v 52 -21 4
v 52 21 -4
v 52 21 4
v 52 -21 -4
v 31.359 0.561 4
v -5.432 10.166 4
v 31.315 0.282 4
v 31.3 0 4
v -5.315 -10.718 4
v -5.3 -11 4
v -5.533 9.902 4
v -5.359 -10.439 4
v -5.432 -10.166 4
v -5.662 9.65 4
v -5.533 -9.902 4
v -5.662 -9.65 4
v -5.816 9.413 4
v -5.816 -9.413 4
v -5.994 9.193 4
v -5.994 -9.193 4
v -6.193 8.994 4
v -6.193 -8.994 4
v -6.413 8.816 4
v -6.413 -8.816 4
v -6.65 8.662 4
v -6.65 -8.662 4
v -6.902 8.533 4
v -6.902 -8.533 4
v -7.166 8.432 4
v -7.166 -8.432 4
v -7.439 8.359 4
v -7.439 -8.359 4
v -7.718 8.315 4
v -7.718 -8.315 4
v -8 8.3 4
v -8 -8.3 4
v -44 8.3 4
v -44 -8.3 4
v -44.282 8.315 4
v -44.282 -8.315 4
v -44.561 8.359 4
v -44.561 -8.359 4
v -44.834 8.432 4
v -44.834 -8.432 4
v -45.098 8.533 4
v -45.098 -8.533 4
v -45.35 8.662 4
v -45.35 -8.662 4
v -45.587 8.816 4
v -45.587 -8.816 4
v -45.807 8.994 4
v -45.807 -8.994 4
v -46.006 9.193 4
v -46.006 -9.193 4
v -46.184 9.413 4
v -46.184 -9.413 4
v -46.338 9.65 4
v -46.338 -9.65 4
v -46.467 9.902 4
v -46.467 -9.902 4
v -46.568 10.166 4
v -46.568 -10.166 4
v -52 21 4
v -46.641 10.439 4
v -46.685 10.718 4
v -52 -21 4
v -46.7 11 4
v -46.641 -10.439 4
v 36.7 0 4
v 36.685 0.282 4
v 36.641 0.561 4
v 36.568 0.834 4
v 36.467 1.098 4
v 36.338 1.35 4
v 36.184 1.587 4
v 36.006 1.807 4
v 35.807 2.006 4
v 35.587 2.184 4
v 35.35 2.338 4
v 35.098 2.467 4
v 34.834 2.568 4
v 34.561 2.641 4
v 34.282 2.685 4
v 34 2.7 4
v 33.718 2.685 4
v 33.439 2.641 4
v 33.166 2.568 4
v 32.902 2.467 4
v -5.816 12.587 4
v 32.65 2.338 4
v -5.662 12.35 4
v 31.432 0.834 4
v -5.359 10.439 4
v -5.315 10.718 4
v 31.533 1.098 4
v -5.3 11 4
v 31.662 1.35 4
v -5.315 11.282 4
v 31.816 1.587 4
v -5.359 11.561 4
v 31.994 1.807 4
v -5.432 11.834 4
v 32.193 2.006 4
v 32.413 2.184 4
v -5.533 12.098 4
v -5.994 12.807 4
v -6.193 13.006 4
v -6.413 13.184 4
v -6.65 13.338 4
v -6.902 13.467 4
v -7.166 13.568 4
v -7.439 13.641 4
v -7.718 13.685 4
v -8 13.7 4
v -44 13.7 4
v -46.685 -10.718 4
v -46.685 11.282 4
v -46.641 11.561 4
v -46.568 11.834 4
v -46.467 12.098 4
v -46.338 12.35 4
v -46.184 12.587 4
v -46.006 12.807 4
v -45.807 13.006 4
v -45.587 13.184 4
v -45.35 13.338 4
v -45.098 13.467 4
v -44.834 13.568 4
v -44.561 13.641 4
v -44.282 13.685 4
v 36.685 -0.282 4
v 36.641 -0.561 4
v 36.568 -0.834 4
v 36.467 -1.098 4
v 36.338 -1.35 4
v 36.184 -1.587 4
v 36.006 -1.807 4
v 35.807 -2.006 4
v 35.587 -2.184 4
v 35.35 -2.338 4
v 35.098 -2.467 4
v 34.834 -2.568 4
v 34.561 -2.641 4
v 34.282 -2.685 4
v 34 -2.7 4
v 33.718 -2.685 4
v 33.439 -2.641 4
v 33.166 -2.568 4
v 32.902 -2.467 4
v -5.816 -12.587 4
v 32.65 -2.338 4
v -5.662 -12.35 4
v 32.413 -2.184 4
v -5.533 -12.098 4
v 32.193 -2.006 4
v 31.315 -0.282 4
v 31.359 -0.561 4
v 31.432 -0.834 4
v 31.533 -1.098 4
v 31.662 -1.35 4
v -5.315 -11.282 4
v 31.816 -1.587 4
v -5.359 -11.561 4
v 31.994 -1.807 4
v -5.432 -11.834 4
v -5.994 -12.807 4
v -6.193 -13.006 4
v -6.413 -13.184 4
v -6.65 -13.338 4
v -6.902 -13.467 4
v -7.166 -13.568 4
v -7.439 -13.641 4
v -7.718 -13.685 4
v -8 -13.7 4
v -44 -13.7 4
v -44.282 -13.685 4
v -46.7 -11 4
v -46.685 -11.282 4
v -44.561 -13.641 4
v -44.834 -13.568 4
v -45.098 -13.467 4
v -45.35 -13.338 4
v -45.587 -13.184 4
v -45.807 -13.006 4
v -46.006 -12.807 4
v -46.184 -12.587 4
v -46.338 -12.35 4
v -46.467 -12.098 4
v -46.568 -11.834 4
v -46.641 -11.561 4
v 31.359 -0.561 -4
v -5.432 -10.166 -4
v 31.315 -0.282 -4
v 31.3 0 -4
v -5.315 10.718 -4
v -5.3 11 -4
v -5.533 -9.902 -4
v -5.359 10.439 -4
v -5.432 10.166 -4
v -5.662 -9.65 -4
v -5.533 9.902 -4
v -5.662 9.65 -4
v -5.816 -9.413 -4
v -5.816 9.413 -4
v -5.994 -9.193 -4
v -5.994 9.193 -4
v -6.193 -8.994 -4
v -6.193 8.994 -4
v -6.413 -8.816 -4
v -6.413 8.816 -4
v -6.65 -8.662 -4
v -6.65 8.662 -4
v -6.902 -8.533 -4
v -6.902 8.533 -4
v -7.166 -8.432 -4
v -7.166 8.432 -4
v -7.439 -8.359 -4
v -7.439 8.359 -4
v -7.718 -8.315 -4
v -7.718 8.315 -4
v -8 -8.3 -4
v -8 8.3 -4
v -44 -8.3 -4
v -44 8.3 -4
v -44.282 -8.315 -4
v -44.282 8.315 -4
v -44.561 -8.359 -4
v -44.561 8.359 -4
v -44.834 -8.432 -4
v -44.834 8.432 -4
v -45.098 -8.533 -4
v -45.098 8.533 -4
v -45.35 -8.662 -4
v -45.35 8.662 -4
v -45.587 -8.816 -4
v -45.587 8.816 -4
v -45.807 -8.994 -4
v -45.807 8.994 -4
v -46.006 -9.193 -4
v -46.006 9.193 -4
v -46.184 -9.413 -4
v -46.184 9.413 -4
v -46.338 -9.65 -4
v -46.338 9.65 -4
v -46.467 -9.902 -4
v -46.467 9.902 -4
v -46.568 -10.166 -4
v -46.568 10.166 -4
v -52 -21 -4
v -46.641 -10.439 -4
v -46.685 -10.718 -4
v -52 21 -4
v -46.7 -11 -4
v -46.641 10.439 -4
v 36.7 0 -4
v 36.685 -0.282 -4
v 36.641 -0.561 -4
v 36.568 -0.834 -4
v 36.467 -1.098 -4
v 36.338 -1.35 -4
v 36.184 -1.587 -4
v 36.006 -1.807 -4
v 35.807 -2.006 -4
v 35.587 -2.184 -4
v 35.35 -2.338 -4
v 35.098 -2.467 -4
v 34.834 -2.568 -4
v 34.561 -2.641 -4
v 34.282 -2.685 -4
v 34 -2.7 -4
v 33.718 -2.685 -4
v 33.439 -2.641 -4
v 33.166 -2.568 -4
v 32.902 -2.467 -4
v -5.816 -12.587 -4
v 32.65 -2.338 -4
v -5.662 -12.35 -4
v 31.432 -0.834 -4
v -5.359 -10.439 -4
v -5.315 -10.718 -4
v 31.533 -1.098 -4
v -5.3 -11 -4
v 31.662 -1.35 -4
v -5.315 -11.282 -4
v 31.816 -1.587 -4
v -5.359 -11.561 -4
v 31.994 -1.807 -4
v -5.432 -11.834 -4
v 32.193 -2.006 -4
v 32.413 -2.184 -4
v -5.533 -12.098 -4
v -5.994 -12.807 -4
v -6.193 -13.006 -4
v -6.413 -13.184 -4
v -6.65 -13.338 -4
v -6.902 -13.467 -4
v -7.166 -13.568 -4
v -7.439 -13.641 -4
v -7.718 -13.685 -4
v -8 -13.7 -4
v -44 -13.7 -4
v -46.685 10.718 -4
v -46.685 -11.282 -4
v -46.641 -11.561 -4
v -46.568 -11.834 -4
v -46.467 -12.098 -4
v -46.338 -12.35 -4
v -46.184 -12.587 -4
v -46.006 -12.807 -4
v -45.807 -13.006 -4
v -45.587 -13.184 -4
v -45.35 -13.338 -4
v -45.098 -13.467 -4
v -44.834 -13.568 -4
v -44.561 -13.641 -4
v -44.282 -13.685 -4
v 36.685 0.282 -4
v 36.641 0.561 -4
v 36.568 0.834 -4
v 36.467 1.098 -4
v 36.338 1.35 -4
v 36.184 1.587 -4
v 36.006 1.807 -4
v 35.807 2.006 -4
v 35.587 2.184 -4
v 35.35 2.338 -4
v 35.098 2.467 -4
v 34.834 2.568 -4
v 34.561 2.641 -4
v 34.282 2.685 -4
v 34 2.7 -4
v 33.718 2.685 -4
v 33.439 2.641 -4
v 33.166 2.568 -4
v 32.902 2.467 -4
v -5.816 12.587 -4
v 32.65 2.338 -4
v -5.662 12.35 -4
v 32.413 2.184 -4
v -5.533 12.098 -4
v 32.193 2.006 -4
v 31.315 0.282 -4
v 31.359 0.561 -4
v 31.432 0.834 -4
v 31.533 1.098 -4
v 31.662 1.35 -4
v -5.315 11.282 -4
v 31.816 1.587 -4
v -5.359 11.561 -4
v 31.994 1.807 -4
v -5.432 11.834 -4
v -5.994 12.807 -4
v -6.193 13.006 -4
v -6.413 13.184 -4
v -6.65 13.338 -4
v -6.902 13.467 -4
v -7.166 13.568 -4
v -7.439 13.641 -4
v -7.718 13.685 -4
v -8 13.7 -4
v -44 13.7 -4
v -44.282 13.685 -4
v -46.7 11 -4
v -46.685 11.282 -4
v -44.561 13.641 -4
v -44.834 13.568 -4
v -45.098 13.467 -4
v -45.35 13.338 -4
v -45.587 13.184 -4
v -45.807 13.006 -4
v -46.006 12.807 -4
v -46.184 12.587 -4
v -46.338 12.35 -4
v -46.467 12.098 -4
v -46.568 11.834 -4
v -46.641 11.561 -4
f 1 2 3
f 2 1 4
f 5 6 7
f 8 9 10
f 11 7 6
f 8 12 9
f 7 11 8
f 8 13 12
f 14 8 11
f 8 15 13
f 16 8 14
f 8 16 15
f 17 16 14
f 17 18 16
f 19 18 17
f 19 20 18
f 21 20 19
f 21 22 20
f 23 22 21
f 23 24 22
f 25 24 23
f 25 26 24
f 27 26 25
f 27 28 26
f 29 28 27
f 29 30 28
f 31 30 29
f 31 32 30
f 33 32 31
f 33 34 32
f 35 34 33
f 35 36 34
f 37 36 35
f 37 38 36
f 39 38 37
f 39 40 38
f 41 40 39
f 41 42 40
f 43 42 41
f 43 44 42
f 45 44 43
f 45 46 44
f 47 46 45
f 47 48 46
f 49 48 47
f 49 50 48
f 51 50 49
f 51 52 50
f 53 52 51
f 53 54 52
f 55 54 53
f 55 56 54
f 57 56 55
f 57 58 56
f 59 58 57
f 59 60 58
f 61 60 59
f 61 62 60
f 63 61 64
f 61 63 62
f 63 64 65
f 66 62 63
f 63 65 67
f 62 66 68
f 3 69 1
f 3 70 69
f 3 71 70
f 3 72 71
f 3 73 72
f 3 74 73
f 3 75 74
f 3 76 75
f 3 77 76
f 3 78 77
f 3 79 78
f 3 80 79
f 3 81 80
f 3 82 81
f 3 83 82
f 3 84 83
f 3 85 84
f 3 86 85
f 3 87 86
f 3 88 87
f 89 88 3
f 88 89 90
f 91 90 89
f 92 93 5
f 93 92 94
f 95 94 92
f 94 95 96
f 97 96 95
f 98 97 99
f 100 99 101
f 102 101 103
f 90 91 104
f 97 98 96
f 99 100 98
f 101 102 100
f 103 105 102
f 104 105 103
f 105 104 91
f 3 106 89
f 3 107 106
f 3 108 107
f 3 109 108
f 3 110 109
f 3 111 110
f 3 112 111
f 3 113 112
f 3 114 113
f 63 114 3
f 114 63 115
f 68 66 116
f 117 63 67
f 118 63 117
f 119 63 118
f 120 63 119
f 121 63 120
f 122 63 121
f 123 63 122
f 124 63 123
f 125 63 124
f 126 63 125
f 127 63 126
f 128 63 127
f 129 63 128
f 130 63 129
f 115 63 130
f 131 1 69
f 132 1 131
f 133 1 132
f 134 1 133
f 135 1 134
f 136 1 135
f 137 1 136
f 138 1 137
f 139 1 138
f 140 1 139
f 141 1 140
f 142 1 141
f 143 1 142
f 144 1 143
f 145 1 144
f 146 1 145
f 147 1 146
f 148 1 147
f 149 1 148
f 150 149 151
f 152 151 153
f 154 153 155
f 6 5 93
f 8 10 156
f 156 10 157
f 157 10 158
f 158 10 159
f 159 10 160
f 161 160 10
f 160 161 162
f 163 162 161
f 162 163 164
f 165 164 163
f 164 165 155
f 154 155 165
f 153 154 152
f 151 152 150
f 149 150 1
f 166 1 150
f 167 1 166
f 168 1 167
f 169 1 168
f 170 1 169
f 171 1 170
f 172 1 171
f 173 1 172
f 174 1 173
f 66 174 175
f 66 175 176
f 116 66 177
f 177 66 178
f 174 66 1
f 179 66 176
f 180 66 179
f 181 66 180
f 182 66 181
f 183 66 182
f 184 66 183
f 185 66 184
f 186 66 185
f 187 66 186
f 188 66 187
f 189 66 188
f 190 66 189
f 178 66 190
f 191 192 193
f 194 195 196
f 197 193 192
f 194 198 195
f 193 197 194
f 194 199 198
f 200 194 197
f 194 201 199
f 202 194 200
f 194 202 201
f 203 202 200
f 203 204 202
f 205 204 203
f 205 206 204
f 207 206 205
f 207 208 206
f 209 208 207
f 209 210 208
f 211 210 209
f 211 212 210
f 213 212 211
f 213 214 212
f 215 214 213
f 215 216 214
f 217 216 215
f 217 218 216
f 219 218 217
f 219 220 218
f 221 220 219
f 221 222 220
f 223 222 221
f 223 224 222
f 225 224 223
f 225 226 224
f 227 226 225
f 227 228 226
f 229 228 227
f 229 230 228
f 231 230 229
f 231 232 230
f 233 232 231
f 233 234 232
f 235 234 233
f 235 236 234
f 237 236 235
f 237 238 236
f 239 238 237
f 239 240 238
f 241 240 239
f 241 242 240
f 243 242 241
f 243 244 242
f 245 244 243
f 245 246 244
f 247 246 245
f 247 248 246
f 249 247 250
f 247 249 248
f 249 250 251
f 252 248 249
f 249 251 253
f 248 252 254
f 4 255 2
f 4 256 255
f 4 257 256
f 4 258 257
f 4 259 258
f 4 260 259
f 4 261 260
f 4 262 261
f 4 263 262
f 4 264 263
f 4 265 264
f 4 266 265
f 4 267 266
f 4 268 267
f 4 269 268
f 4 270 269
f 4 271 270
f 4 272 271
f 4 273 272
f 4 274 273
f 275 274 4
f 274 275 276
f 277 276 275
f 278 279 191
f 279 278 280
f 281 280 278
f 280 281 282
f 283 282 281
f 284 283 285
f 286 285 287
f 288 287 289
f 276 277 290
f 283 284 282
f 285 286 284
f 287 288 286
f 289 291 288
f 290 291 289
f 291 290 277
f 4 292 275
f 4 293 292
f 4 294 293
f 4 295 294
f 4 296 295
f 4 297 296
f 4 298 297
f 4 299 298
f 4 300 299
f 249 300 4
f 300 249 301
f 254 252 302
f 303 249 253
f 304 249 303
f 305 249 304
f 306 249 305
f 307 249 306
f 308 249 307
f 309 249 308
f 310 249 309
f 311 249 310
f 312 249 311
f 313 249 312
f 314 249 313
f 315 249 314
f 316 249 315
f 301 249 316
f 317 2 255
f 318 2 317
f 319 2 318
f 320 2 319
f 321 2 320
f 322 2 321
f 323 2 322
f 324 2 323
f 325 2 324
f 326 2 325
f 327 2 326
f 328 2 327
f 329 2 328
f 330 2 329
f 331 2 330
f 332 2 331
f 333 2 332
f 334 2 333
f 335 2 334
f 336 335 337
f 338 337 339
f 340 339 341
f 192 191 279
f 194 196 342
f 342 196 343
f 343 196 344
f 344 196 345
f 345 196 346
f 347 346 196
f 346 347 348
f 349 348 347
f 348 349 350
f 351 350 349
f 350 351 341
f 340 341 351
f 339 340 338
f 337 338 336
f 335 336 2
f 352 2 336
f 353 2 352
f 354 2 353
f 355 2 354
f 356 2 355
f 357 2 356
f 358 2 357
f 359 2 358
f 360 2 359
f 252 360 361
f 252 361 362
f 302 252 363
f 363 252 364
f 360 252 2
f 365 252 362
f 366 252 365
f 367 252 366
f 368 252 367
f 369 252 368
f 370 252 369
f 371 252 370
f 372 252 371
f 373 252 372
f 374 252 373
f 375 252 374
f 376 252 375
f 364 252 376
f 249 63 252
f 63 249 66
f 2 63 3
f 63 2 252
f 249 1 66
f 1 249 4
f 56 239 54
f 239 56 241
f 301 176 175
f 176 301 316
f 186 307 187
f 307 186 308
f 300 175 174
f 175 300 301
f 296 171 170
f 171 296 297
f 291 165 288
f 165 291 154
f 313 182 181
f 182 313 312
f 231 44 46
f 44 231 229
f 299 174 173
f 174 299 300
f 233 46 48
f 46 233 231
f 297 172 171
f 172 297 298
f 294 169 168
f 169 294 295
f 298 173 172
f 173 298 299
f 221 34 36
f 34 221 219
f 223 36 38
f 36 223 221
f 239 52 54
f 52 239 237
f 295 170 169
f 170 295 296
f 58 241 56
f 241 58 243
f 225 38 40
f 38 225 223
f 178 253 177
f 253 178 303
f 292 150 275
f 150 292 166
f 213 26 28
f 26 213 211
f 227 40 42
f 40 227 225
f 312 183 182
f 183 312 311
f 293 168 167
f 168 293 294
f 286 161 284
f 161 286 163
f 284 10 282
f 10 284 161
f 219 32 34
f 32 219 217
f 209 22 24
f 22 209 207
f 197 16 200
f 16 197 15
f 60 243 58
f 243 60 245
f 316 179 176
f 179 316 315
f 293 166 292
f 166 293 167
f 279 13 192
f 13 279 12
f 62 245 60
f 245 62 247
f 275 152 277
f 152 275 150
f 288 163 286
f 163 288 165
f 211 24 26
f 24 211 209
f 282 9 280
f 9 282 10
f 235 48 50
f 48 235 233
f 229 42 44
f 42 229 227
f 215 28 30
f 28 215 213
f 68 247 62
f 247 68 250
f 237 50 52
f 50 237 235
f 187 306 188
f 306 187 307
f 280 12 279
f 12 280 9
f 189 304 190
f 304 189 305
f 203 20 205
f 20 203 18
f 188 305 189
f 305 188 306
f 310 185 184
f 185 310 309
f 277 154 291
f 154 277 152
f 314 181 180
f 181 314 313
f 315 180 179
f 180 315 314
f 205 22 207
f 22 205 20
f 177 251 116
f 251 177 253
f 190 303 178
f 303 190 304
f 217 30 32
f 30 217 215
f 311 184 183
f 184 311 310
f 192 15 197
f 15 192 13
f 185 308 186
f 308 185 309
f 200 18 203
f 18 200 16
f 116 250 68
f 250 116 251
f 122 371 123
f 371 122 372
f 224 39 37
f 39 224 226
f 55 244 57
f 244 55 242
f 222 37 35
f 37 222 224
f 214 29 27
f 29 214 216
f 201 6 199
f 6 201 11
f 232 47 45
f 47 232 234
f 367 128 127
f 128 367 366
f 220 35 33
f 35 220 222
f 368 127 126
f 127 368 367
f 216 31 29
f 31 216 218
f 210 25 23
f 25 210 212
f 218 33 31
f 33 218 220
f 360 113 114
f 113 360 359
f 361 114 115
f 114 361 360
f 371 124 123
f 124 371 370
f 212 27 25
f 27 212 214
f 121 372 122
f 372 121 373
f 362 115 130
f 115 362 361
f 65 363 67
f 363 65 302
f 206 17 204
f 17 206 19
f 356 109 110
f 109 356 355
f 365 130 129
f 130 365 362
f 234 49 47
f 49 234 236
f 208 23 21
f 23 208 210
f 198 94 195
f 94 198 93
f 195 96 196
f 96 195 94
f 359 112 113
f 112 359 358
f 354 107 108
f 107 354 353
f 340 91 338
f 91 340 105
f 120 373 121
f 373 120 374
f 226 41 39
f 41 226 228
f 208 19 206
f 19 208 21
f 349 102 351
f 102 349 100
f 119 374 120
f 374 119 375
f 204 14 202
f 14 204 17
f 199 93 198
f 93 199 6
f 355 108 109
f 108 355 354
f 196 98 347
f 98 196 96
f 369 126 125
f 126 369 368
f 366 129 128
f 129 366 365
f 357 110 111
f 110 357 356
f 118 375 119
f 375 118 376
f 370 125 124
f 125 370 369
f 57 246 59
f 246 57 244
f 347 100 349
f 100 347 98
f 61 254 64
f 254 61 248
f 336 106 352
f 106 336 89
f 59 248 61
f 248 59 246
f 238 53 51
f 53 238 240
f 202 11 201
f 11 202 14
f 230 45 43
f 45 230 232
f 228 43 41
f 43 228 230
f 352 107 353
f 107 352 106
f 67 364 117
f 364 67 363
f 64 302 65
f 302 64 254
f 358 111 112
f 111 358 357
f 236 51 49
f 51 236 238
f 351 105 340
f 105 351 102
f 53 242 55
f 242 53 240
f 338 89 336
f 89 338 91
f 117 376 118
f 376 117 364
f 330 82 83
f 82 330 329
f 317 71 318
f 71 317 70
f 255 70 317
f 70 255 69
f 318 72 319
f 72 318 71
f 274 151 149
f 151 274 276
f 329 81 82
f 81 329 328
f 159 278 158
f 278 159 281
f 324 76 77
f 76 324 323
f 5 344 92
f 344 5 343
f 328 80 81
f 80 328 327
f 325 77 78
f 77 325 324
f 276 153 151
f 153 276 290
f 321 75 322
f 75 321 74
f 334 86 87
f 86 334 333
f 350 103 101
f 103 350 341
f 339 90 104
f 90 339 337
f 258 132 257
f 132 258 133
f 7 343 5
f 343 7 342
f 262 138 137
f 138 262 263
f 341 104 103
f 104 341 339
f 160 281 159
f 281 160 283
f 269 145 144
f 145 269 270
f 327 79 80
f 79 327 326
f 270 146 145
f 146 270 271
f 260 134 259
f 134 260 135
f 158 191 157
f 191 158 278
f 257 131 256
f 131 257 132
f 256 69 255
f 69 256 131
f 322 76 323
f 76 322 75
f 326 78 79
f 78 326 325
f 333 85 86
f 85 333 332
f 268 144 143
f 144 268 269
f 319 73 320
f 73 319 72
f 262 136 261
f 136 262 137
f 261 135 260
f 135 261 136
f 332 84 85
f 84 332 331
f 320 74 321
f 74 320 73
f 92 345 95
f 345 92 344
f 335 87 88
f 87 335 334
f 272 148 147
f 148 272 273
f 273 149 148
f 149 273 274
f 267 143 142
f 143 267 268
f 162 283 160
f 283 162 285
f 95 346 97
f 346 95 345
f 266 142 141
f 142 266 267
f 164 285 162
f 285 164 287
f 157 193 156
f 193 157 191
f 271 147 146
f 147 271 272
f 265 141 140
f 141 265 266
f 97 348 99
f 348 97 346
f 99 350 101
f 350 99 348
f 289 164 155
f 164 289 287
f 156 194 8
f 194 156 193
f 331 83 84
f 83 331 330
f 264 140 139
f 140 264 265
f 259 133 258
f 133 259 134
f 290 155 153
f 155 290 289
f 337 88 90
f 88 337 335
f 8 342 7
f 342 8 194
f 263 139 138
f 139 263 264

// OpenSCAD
// GT2 idler tensioner slide for 12 mm belt.
$fn = 60;
eps = 0.02;
slide_l = 104;
slide_w = 42;
slide_t = 8;
belt_w = 12;
slot_l = 36;
axle_d = 5.4;
axle_x = slide_l / 2 - 18;
module slot(y) {
    hull() {
        translate([-slide_l / 4 - slot_l / 2, y, -slide_t / 2 - eps]) cylinder(d = 5.4, h = slide_t + 2 * eps);
        translate([-slide_l / 4 + slot_l / 2, y, -slide_t / 2 - eps]) cylinder(d = 5.4, h = slide_t + 2 * eps);
    }
}
difference() {
    cube([slide_l, slide_w, slide_t], center = true);
    slot(-11);
    slot(11);
    translate([axle_x, 0, -slide_t / 2 - eps]) cylinder(d = axle_d, h = slide_t + 2 * eps);
}
